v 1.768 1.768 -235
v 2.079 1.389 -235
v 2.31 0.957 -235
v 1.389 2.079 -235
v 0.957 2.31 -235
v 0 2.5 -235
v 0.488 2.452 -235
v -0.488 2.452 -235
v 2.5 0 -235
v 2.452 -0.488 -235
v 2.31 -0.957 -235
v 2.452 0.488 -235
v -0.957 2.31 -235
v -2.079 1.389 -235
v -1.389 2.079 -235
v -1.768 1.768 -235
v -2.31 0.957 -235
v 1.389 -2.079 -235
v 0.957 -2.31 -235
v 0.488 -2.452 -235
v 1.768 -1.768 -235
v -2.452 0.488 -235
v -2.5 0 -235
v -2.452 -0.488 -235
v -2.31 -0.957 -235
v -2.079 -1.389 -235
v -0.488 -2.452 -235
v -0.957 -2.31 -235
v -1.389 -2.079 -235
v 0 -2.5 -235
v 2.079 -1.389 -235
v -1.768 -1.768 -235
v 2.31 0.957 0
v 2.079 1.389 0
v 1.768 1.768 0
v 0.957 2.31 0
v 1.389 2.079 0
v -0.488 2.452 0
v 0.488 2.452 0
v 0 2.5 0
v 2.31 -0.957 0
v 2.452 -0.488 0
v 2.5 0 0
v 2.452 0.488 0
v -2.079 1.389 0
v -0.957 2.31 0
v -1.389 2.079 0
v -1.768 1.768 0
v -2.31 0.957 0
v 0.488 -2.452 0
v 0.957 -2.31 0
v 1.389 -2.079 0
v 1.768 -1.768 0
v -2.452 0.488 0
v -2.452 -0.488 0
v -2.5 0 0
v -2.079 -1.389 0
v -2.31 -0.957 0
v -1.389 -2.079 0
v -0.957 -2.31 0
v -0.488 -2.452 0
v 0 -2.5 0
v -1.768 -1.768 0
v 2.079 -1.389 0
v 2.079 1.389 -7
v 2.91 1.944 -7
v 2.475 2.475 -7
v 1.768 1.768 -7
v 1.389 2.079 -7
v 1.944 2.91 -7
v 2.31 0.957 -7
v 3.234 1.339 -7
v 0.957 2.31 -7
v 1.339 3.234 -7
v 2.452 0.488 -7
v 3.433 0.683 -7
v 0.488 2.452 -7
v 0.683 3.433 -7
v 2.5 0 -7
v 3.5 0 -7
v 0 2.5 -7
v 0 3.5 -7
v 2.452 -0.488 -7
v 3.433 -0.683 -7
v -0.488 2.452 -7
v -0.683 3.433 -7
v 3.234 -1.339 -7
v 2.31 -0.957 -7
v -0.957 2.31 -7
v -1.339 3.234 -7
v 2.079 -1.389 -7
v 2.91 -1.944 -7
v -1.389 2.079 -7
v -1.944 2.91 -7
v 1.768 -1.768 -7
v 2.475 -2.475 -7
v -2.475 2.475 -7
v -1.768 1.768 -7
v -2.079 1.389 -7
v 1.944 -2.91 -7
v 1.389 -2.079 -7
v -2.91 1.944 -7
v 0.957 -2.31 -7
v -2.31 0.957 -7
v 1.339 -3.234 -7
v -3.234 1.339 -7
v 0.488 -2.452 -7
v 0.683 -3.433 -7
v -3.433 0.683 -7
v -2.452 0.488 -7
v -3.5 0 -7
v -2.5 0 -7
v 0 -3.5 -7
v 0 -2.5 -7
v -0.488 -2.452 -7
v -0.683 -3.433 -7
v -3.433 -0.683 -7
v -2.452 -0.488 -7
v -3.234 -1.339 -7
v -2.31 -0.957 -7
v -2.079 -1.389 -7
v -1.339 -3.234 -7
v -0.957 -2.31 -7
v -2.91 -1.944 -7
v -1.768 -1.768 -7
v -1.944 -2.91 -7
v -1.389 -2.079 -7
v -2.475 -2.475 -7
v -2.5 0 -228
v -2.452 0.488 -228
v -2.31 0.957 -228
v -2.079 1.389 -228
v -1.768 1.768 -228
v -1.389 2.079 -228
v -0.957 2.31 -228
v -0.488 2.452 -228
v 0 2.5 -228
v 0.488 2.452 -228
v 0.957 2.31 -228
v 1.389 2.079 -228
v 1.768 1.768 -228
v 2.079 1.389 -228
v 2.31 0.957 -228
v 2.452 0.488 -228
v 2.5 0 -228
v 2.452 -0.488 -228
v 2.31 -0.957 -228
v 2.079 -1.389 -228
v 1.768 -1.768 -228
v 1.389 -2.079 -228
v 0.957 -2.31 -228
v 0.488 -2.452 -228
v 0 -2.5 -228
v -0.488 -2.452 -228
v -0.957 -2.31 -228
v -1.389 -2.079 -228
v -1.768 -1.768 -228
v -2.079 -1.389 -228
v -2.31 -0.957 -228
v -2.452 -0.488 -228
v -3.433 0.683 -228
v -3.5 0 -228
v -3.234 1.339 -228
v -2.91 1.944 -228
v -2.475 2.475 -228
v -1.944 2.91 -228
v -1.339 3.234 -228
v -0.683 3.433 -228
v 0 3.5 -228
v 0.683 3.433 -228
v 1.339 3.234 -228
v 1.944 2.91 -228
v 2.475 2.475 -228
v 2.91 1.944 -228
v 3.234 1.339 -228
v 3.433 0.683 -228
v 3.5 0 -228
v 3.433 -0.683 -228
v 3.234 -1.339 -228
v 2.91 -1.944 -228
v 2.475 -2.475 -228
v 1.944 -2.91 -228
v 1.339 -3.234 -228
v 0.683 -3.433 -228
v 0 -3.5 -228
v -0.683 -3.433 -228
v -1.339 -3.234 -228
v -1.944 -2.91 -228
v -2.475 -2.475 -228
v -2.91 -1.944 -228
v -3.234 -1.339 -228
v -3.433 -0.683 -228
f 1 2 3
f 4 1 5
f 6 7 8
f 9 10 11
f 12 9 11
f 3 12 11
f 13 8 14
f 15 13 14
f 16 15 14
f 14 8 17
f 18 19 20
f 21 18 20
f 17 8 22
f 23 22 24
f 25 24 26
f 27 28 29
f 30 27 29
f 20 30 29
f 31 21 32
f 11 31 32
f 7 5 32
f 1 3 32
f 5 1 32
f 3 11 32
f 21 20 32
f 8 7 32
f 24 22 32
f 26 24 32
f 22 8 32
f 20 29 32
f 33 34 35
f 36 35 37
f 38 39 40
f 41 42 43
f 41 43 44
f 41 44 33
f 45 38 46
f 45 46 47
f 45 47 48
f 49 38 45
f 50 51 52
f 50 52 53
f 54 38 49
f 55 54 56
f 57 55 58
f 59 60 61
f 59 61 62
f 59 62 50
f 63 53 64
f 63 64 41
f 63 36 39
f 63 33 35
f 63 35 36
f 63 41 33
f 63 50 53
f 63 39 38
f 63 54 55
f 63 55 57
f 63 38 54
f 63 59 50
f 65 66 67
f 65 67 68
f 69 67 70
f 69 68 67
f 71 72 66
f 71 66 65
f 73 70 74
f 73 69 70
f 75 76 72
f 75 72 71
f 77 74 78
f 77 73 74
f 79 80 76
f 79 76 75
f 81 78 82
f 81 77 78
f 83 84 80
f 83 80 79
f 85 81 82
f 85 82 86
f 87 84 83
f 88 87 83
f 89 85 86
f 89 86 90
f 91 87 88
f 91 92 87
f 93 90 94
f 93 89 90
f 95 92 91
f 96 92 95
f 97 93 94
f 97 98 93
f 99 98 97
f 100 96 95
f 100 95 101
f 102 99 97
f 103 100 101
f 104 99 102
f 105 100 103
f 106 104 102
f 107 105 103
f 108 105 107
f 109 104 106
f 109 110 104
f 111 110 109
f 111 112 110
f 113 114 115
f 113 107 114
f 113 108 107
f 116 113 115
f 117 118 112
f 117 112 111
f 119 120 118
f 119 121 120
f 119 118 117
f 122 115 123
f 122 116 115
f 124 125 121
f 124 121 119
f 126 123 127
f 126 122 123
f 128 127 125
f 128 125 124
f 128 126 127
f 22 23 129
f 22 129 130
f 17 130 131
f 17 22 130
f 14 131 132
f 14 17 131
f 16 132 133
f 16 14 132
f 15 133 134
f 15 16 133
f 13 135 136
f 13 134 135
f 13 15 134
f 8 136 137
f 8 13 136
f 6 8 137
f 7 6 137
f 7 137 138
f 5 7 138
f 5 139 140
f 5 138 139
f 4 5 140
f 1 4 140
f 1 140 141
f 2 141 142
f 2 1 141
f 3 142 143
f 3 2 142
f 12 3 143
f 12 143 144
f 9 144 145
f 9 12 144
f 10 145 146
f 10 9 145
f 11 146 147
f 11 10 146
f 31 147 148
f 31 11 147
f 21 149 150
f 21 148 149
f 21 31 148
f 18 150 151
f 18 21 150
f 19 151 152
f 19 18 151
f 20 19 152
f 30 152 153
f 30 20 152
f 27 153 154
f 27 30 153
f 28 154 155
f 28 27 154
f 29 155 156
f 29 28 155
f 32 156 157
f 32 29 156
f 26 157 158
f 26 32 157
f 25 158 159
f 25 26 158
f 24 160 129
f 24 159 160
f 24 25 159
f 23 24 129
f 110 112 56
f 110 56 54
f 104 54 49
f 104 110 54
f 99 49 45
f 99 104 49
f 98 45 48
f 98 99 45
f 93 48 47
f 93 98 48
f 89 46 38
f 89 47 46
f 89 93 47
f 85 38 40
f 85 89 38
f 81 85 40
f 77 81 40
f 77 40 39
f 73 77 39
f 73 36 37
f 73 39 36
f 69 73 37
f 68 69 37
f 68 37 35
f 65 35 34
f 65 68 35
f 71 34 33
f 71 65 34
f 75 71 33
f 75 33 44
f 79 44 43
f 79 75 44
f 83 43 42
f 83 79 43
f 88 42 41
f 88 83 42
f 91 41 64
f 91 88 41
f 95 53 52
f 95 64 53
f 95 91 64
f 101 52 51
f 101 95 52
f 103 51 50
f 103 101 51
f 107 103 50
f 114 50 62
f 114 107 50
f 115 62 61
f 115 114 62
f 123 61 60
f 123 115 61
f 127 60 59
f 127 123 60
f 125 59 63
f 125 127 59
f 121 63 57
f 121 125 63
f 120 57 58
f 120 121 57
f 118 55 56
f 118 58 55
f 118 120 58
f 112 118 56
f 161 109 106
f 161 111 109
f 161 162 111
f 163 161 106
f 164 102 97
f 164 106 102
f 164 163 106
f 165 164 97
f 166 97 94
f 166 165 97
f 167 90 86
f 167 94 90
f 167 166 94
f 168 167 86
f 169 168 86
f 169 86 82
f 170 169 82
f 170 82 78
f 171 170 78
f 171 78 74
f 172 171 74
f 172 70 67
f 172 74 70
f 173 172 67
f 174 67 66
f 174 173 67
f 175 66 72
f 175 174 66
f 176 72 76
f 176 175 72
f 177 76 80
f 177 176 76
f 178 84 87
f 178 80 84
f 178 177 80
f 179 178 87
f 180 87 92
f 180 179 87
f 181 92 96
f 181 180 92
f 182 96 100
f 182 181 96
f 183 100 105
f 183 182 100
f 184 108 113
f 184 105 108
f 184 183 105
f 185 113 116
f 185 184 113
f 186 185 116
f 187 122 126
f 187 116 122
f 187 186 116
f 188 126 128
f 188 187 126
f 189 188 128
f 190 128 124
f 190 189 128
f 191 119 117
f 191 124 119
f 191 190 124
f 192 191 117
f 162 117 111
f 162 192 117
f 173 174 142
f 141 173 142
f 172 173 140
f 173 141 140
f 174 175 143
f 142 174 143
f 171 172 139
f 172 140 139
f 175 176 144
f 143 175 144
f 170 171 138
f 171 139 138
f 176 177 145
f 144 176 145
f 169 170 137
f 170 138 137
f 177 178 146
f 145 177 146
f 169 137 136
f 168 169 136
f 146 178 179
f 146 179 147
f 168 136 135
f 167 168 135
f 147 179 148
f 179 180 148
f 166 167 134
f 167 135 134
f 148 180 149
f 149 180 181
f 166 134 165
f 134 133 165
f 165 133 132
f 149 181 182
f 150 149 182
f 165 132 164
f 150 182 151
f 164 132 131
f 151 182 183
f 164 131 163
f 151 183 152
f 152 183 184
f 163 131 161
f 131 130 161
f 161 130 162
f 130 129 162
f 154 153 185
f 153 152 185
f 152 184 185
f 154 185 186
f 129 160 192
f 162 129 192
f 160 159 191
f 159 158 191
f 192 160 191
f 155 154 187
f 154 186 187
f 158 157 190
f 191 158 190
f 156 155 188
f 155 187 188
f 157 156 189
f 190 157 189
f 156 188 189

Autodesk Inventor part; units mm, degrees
ref_plane "YZ Plane" through (0, 0, 0) normal (1, 0, 0) x (0, 1, 0)
ref_plane "XZ Plane" through (0, 0, 0) normal (0, 1, 0) x (-1, 0, 0)
ref_plane "XY Plane" through (0, 0, 0) normal (0, 0, 1) x (1, 0, 0)
sketch "Skizze1" plane through (0, 0, 0) normal (0, 1, 0) x (-1, 0, 0)
  line L0 (0, 0) -> (2.5, 0)
  line L1 (2.5, 0) -> (2.5, -7)
  line L2 (2.5, -7) -> (3.5, -7)
  line L3 (3.5, -7) -> (3.5, -228)
  line L4 (3.5, -228) -> (2.5, -228)
  line L5 (2.5, -228) -> (2.5, -235)
  line L6 (2.5, -235) -> (0, -235)
  line L7 (0, -235) -> (0, 0)
  dimension "d0" = 7
  dimension "d1" = 5
  dimension "d2" = 7
  dimension "d3" = 7
  dimension "d4" = 235
revolve "Umdrehung1" add sketch "Skizze1" angle 360 about axis through (0, 0, -235) along (0, 0, 1)
equation "\"d3\" = d2"
properties part number "2071"
